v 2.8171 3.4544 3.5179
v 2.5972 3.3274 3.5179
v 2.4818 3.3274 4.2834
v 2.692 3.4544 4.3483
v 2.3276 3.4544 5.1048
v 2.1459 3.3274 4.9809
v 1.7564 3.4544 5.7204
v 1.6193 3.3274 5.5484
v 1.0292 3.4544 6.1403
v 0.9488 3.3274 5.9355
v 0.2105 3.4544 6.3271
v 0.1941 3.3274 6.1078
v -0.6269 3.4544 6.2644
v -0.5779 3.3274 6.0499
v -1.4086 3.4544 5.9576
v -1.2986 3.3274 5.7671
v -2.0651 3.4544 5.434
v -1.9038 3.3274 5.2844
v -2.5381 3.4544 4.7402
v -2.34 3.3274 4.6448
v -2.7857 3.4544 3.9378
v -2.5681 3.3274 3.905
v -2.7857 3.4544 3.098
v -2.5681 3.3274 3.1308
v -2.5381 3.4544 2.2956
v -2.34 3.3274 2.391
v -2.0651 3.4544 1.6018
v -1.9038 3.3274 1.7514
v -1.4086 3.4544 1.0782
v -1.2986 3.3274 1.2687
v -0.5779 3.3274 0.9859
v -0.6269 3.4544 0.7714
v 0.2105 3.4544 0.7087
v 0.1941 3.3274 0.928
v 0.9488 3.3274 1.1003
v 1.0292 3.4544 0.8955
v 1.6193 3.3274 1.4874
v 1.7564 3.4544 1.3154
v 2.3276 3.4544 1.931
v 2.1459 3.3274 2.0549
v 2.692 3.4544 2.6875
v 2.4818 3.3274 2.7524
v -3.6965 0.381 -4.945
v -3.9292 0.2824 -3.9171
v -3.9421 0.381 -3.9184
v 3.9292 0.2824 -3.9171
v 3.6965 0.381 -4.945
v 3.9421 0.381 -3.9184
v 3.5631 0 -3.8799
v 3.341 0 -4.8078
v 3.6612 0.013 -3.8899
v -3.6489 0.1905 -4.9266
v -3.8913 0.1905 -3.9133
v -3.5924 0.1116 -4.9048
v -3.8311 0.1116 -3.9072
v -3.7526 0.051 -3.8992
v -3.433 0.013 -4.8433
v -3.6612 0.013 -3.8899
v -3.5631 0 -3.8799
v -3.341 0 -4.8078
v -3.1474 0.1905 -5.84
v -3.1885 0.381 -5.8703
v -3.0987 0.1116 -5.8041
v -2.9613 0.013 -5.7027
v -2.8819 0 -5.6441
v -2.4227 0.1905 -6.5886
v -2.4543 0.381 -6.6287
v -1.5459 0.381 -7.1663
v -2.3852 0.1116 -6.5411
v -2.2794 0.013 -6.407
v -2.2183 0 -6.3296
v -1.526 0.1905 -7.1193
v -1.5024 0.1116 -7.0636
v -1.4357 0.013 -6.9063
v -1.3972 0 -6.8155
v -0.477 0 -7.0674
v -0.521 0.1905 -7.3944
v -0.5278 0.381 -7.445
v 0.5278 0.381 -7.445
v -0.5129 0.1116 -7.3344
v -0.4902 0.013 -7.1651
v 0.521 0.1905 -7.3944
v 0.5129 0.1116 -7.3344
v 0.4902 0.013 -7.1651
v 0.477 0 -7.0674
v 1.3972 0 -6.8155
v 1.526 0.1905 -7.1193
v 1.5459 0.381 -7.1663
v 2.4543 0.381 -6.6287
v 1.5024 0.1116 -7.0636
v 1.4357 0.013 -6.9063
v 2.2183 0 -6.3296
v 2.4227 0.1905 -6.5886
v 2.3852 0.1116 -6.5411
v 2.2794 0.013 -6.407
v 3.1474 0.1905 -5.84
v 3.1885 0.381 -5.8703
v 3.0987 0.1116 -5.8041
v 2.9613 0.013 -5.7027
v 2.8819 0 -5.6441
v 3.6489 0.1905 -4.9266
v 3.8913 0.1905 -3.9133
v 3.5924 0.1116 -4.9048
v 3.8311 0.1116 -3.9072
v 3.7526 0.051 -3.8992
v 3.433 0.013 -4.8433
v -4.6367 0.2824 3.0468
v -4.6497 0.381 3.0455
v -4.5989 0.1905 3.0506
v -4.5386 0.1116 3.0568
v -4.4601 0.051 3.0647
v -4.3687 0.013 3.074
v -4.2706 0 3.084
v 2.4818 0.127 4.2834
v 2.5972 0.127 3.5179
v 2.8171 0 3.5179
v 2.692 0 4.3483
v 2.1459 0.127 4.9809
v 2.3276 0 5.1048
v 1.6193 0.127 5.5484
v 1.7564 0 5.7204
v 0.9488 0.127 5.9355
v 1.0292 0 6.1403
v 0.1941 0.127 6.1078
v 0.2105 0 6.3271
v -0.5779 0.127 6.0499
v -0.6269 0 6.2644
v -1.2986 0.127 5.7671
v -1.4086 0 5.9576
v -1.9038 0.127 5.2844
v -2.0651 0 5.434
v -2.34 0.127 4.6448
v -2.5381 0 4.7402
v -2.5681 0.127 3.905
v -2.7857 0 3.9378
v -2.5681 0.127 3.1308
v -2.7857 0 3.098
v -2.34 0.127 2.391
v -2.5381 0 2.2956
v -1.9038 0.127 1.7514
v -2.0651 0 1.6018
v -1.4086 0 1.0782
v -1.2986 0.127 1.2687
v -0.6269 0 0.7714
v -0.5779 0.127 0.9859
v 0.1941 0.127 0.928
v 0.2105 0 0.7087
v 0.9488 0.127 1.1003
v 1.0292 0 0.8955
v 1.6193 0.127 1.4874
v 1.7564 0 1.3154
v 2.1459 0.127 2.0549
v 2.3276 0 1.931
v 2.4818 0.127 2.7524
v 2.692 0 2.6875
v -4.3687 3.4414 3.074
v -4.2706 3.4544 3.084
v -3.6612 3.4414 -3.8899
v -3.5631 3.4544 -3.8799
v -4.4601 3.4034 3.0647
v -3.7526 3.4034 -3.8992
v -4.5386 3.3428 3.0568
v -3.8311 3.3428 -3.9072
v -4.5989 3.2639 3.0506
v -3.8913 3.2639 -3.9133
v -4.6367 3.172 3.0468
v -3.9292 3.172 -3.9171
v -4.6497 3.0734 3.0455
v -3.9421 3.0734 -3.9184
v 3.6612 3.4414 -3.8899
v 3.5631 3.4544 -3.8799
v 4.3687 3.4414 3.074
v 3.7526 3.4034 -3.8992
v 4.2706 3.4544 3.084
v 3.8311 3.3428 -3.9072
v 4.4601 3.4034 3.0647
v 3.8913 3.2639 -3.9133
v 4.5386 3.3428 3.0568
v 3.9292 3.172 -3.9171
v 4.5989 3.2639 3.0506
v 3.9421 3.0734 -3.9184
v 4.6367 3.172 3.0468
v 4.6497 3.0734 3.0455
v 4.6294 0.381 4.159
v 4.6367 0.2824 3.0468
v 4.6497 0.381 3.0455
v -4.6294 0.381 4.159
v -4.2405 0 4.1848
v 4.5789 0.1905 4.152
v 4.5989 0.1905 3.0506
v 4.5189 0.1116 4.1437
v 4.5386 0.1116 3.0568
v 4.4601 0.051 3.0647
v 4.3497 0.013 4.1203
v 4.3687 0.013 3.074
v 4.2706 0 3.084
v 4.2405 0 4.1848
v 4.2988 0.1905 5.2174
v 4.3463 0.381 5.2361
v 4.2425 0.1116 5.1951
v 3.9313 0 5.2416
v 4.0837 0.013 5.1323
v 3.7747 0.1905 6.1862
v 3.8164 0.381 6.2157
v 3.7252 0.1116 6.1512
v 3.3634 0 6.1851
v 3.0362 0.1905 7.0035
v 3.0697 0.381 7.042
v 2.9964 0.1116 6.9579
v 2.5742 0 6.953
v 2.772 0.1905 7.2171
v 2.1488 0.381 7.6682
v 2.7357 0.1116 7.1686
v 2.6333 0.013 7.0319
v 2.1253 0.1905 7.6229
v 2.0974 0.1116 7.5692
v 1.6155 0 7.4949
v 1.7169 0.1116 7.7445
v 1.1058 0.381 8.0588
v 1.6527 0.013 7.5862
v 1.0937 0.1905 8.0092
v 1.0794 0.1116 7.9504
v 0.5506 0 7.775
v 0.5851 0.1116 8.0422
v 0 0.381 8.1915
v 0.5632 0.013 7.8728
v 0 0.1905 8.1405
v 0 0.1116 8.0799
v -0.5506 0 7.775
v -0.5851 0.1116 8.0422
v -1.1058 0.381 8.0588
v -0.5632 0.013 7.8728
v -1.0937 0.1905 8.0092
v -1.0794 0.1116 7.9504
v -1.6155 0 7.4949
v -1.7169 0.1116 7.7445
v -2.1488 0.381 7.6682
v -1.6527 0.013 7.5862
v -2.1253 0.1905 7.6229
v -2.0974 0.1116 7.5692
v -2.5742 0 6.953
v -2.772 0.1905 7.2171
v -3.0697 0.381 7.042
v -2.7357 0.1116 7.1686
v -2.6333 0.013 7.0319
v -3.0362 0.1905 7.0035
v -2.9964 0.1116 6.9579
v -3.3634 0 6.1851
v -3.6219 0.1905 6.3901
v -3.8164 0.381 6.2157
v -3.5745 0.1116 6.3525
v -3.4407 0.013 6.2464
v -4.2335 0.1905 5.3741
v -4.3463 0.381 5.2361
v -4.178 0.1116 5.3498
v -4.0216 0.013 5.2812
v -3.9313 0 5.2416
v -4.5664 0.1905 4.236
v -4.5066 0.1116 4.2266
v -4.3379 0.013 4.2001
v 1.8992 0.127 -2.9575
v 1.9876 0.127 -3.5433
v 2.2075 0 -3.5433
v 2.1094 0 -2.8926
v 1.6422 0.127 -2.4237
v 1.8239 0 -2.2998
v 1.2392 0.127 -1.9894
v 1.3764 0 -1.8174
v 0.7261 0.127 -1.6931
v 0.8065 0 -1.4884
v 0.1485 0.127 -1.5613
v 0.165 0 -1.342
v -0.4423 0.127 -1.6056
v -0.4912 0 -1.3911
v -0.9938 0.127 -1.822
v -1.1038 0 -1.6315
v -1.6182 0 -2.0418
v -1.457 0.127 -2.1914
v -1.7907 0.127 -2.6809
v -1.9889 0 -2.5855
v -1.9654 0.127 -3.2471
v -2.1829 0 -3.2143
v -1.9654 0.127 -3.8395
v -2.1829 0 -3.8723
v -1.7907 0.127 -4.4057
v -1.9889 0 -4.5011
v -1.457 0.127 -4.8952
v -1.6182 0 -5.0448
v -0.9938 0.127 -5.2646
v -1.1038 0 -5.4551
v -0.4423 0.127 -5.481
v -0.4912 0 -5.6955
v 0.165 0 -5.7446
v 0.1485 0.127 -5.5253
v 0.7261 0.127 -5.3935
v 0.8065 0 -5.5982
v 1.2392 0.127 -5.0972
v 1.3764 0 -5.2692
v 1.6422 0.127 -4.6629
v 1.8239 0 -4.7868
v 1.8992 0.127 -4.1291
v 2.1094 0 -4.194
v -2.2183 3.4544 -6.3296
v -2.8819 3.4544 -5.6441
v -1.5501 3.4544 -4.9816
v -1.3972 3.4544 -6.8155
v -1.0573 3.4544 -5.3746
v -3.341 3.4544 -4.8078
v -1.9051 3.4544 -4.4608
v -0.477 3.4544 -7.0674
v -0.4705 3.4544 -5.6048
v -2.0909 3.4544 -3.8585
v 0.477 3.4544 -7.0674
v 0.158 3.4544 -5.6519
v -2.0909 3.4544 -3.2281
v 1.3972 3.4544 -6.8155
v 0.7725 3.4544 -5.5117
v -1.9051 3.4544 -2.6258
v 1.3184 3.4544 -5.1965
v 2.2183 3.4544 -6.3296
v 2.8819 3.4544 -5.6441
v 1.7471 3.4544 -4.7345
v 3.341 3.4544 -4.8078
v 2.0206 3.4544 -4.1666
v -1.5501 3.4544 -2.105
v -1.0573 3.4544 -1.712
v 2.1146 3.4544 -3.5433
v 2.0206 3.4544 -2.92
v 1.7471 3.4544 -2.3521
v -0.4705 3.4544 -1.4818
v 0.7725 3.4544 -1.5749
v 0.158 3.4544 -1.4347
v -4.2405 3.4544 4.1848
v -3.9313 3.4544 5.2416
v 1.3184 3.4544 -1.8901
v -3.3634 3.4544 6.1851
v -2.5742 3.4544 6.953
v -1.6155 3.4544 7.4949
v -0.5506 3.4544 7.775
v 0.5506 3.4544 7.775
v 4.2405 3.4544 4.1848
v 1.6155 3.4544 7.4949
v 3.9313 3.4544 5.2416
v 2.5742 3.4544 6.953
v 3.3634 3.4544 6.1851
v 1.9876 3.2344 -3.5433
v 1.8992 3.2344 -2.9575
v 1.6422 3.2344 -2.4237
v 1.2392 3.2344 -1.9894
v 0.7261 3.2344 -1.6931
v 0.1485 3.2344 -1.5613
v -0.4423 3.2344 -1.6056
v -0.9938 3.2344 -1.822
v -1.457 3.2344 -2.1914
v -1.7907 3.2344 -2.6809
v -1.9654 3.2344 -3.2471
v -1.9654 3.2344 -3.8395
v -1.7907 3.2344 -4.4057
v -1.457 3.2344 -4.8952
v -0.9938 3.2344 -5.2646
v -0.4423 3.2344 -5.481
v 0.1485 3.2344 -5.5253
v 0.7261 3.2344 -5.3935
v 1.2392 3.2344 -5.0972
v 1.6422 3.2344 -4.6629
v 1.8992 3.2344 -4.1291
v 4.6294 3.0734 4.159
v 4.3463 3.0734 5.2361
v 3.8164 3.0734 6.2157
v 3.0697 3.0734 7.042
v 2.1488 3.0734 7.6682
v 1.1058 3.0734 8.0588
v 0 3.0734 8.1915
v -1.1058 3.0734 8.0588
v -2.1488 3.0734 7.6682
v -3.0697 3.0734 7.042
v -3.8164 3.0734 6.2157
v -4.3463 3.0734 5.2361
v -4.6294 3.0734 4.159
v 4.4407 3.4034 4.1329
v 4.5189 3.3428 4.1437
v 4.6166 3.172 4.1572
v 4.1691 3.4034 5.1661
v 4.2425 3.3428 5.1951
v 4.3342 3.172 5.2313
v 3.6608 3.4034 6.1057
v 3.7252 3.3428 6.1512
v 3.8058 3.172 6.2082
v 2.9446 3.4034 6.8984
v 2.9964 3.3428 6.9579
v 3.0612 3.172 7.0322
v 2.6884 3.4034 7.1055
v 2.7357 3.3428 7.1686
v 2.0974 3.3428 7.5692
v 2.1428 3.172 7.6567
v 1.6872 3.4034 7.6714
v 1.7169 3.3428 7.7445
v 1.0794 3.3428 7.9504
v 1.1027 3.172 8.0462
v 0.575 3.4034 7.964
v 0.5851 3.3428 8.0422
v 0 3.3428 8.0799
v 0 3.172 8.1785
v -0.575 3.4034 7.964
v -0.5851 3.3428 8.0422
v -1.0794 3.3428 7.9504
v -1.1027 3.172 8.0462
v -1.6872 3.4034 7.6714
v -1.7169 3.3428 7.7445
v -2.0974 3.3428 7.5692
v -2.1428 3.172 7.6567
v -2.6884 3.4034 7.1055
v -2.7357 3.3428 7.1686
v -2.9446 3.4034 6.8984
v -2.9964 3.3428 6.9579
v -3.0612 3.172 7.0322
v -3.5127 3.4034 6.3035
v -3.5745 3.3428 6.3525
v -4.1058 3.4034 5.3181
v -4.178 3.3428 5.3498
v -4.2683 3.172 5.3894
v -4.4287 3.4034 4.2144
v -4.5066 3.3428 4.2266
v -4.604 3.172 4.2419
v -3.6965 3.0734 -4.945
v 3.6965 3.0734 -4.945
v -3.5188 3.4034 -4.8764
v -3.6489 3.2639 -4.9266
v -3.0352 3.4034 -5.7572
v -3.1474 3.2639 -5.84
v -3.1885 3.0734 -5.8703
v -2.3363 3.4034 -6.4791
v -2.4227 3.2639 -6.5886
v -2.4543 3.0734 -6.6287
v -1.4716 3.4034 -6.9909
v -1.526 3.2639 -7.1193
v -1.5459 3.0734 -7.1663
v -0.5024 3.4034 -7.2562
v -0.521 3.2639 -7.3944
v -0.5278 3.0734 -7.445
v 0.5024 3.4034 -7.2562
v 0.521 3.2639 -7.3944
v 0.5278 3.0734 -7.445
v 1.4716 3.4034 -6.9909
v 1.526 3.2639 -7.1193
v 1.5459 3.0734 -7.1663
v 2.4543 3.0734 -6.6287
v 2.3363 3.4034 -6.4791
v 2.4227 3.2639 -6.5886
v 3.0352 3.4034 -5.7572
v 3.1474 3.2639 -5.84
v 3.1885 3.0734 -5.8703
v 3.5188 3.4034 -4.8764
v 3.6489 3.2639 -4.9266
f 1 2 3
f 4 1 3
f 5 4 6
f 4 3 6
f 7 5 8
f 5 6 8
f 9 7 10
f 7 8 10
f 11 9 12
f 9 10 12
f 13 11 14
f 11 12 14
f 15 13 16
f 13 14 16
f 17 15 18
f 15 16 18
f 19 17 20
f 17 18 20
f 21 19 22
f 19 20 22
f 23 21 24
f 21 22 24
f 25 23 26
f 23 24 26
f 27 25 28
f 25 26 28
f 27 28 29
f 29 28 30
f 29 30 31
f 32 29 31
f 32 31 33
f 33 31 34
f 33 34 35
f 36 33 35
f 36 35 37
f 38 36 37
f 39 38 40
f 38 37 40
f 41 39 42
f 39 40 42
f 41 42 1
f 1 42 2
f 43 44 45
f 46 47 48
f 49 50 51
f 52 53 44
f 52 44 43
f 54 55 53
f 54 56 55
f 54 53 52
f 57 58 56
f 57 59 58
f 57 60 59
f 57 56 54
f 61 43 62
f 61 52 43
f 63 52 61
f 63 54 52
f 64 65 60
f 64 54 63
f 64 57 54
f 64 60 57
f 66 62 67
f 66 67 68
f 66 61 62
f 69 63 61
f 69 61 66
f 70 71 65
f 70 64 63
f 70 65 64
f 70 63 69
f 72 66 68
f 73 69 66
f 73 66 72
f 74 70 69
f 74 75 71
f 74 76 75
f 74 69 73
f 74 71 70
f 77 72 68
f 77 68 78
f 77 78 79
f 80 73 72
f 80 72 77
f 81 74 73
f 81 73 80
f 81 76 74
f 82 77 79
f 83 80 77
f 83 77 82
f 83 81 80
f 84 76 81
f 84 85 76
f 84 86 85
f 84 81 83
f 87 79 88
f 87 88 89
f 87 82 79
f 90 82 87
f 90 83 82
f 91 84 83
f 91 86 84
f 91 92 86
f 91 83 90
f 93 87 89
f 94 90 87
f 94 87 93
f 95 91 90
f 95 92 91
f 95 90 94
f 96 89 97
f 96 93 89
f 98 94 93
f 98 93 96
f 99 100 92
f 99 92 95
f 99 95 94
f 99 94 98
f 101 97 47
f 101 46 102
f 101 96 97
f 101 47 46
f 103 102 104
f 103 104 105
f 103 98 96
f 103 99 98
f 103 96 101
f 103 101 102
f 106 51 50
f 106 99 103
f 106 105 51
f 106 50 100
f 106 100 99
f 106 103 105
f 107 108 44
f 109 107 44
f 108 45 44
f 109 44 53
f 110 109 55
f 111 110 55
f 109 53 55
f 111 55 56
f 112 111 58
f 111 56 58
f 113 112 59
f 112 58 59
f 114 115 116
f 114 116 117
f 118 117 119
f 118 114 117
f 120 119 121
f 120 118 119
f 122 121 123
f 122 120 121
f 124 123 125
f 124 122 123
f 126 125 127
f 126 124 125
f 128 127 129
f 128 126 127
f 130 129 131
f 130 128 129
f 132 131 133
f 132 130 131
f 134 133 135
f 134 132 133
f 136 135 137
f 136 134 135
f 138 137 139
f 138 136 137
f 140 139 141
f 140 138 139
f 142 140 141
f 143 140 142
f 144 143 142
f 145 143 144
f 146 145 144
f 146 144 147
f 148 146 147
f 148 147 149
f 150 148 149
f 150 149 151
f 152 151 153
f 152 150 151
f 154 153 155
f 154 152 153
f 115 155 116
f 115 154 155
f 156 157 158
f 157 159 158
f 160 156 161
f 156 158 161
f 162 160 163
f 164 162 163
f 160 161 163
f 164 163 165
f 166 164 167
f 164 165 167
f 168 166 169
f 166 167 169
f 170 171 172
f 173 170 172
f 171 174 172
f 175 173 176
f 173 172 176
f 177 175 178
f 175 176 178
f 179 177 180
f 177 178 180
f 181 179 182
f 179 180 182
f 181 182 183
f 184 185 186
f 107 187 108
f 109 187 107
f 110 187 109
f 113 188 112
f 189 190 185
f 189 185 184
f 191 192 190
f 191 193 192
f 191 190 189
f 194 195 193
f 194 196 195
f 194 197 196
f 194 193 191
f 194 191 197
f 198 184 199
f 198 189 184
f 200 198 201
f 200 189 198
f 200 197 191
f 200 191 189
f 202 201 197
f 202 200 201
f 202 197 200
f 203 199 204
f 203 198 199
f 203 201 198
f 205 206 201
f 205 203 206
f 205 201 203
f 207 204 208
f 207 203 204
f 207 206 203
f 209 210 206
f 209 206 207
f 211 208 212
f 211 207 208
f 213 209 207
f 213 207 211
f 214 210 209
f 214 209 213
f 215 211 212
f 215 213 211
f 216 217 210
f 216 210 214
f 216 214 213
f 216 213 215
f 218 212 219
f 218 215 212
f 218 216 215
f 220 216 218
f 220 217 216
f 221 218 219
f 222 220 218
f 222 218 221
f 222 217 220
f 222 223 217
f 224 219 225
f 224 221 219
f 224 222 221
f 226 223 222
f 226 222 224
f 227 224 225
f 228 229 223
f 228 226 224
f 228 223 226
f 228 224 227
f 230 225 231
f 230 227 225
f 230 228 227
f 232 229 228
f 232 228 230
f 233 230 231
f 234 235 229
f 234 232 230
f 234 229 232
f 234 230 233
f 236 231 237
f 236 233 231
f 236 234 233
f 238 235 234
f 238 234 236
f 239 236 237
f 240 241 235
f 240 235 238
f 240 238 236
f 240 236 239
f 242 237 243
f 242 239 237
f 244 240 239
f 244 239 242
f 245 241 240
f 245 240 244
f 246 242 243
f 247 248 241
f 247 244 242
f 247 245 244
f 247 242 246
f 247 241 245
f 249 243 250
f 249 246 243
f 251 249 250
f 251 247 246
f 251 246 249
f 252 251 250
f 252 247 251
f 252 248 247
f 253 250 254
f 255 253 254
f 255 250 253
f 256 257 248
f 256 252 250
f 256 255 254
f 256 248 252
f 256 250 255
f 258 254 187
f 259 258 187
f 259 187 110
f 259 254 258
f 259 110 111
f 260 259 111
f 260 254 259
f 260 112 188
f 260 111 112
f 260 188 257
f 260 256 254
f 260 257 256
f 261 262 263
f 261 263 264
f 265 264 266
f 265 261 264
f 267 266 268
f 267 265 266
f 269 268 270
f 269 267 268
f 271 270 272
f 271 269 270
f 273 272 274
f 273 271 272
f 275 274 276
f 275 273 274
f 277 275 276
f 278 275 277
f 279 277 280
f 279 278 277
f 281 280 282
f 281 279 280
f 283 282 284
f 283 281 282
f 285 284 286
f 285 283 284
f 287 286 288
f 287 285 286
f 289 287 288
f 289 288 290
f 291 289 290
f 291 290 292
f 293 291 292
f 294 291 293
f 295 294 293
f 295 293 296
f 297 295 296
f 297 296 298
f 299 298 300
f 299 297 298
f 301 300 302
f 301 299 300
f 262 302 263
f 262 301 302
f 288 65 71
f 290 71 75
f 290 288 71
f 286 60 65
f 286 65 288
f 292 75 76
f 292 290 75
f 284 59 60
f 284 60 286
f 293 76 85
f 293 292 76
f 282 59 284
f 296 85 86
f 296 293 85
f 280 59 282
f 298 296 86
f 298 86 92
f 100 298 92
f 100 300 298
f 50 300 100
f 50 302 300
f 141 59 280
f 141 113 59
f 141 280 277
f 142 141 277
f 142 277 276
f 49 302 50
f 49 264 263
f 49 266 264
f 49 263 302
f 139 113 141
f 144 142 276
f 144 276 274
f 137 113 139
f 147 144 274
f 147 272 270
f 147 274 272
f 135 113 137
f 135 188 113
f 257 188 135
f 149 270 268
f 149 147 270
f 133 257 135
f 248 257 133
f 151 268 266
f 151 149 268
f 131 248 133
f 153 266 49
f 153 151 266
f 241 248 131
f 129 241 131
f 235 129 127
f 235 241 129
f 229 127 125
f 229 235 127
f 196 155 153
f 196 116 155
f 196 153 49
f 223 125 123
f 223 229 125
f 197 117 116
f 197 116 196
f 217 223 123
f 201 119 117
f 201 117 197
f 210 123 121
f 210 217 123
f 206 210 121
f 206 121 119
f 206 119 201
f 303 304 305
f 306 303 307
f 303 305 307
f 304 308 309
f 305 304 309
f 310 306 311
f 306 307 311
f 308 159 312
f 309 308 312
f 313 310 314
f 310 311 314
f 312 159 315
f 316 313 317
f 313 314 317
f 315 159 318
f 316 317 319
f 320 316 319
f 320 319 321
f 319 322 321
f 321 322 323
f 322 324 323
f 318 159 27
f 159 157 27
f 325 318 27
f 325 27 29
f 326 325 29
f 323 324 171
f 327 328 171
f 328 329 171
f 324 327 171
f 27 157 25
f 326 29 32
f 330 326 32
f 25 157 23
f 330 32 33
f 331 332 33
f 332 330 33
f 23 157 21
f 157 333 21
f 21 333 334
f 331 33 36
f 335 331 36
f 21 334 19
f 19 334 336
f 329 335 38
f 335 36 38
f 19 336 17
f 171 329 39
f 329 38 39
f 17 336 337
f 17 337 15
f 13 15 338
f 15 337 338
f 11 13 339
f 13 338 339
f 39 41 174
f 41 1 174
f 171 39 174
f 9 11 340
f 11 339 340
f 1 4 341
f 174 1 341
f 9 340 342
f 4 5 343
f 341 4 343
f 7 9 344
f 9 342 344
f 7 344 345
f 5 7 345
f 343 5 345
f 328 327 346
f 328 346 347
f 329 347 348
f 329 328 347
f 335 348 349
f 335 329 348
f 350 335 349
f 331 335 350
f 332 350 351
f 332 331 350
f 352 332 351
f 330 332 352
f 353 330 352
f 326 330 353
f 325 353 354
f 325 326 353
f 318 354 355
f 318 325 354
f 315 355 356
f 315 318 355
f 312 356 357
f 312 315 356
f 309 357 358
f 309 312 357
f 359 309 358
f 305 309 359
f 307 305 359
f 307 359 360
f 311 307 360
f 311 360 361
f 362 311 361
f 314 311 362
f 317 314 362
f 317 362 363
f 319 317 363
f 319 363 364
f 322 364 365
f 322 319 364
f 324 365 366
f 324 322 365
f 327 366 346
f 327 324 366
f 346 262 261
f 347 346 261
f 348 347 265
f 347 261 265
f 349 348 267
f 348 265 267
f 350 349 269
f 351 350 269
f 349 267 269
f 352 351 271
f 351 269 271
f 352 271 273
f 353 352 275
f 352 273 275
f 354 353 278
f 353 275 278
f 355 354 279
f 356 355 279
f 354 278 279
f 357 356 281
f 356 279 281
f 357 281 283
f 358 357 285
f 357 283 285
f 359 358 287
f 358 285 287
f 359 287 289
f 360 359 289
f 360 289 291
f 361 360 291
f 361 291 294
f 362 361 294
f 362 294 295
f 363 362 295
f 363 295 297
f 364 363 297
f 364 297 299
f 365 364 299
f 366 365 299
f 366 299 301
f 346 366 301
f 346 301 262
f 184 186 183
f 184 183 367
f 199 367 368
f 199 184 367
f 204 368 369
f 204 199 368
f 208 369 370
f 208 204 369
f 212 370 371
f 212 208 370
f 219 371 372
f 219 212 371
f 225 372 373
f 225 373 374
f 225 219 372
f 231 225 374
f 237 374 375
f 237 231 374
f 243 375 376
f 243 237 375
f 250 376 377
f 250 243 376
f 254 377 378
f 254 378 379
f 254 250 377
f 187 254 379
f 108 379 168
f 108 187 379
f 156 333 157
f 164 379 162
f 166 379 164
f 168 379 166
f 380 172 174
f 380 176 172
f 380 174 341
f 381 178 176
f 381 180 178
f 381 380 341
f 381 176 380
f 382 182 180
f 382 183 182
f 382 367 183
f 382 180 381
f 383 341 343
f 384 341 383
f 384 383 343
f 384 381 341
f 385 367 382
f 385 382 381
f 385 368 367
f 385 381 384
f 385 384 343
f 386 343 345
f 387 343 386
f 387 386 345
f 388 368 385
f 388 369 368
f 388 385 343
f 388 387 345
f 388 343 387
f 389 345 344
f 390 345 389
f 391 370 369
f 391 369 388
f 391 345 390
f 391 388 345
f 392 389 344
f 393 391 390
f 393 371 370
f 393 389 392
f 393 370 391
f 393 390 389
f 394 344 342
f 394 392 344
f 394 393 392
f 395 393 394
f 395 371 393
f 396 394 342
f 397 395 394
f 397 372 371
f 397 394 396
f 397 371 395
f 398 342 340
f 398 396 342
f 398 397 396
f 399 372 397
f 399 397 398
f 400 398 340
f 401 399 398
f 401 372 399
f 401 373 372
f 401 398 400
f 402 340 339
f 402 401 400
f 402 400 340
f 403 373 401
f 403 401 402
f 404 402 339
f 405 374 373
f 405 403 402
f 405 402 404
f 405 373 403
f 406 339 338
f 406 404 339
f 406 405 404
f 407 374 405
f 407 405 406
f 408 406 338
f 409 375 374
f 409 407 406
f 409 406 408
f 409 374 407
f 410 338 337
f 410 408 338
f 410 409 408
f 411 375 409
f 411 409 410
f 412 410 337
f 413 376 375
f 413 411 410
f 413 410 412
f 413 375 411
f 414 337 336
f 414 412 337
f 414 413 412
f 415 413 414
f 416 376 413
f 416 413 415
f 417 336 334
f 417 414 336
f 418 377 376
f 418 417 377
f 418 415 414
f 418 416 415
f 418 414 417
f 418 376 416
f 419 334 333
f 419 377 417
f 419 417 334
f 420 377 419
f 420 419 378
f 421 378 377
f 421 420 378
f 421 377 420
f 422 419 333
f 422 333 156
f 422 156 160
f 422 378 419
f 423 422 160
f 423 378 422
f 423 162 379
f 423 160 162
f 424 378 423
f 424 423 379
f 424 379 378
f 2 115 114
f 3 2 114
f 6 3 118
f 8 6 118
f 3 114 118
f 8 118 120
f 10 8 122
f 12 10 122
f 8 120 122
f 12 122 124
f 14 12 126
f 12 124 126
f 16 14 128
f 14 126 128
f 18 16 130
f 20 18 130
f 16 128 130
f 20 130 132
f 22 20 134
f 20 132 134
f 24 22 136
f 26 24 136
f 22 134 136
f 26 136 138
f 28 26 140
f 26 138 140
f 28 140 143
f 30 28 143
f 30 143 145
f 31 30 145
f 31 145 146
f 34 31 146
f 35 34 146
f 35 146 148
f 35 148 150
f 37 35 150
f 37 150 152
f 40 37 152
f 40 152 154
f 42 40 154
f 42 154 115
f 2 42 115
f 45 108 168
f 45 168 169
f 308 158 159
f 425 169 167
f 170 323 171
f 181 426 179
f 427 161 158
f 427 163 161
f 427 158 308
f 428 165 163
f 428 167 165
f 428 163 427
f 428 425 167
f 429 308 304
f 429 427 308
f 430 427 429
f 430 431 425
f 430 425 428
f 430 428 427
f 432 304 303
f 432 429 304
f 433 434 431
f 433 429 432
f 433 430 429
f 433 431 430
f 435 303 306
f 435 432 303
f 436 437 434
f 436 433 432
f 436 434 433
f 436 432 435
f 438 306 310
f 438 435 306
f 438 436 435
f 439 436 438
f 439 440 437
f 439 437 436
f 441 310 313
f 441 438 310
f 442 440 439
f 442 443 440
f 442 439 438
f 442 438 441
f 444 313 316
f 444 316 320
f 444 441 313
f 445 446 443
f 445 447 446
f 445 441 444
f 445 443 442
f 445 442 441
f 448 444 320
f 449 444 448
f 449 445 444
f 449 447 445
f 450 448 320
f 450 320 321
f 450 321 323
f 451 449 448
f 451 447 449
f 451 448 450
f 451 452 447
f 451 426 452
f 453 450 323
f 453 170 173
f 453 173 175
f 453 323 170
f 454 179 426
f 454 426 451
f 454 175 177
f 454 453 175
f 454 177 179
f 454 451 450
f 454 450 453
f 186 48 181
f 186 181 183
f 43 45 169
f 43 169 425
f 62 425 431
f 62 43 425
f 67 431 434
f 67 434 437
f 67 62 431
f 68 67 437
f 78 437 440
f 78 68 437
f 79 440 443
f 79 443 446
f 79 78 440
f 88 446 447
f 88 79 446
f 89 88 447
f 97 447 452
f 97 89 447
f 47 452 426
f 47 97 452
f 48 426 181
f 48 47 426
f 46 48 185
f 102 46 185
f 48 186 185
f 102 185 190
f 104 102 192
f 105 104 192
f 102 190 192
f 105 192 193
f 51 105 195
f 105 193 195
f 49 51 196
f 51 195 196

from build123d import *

# Parameters (mm, degrees)
F1_DEPTH    = 3.4544
F2_R        = 2.59715
F2_R_2      = 1.98755
F3_DEPTH    = 3.4554
F4_C1_SIZE2 = 0.127
F4_C1_SIZE  = 0.2199704526
F4_C2_SIZE2 = 0.127
F4_C2_SIZE  = 0.2199704526
F4_C3_SIZE2 = 0.127
F4_C3_SIZE  = 0.2199704526
F4_C4_SIZE2 = 0.127
F4_C4_SIZE  = 0.2199704526
F5_R        = 0.381


with BuildPart() as f1:
    # F0 (on Front) → F1 (new body)
    with BuildSketch(Plane.XZ):
        with BuildLine():
            Line((3.9421045586, -3.9184314079), (4.6496617871, 3.0454783394))
            ThreePointArc((4.6496617871, 3.0454783394), (0, 8.1915), (-4.6496617871, 3.0454783394))
            Line((-4.6496617871, 3.0454783394), (-3.9421045586, -3.9184314079))
            ThreePointArc((-3.9421045586, -3.9184314079), (0, -7.4803), (3.9421045586, -3.9184314079))
        make_face()
    extrude(amount=-F1_DEPTH)

    # F2 (on face) → F3 (cut, through all)
    with BuildSketch(Plane.XZ):
        with Locations((0, 3.5179)):
            Circle(F2_R)
        with Locations((0, -3.5433)):
            Circle(F2_R_2)
    extrude(amount=-F3_DEPTH, mode=Mode.SUBTRACT)

    # F4: chamfer of 0.127 x 0.2199704526 on 4 edges, made by hand

    # F4_c1
    f4_c1_edges = [f1.edges().sort_by_distance(p)[0] for p in [
        (-1.98755, 0, -3.5433),
    ]]
    f4_c1_side = f1.faces().sort_by_distance((-1.99009, 0, -3.5433))[0]
    chamfer(f4_c1_edges, length=F4_C1_SIZE, length2=F4_C1_SIZE2, reference=f4_c1_side)

    # F4_c2
    f4_c2_edges = [f1.edges().sort_by_distance(p)[0] for p in [
        (-2.59715, 0, 3.5179),
    ]]
    f4_c2_side = f1.faces().sort_by_distance((-2.59969, 0, 3.5179))[0]
    chamfer(f4_c2_edges, length=F4_C2_SIZE, length2=F4_C2_SIZE2, reference=f4_c2_side)

    # F4_c3
    f4_c3_edges = [f1.edges().sort_by_distance(p)[0] for p in [
        (-1.98755, 3.4544, -3.5433),
    ]]
    f4_c3_side = f1.faces().sort_by_distance((-1.98755, 3.45186, -3.5433))[0]
    chamfer(f4_c3_edges, length=F4_C3_SIZE, length2=F4_C3_SIZE2, reference=f4_c3_side)

    # F4_c4
    f4_c4_edges = [f1.edges().sort_by_distance(p)[0] for p in [
        (-2.59715, 3.4544, 3.5179),
    ]]
    f4_c4_side = f1.faces().sort_by_distance((-2.59969, 3.4544, 3.5179))[0]
    chamfer(f4_c4_edges, length=F4_C4_SIZE, length2=F4_C4_SIZE2, reference=f4_c4_side)

    # F5
    f5_edges = [f1.edges().sort_by_distance(p)[0] for p in [
        (0, 0, -7.4803),
        (0, 3.4544, -7.4803),
        (4.295883, 3.4544, -0.436477),
        (0, 3.4544, 8.1915),
        (-4.295883, 3.4544, -0.436477),
        (4.295883, 0, -0.436477),
        (0, 0, 8.1915),
        (-4.295883, 0, -0.436477),
    ]]
    fillet(f5_edges, radius=F5_R)


solid = f1.part
